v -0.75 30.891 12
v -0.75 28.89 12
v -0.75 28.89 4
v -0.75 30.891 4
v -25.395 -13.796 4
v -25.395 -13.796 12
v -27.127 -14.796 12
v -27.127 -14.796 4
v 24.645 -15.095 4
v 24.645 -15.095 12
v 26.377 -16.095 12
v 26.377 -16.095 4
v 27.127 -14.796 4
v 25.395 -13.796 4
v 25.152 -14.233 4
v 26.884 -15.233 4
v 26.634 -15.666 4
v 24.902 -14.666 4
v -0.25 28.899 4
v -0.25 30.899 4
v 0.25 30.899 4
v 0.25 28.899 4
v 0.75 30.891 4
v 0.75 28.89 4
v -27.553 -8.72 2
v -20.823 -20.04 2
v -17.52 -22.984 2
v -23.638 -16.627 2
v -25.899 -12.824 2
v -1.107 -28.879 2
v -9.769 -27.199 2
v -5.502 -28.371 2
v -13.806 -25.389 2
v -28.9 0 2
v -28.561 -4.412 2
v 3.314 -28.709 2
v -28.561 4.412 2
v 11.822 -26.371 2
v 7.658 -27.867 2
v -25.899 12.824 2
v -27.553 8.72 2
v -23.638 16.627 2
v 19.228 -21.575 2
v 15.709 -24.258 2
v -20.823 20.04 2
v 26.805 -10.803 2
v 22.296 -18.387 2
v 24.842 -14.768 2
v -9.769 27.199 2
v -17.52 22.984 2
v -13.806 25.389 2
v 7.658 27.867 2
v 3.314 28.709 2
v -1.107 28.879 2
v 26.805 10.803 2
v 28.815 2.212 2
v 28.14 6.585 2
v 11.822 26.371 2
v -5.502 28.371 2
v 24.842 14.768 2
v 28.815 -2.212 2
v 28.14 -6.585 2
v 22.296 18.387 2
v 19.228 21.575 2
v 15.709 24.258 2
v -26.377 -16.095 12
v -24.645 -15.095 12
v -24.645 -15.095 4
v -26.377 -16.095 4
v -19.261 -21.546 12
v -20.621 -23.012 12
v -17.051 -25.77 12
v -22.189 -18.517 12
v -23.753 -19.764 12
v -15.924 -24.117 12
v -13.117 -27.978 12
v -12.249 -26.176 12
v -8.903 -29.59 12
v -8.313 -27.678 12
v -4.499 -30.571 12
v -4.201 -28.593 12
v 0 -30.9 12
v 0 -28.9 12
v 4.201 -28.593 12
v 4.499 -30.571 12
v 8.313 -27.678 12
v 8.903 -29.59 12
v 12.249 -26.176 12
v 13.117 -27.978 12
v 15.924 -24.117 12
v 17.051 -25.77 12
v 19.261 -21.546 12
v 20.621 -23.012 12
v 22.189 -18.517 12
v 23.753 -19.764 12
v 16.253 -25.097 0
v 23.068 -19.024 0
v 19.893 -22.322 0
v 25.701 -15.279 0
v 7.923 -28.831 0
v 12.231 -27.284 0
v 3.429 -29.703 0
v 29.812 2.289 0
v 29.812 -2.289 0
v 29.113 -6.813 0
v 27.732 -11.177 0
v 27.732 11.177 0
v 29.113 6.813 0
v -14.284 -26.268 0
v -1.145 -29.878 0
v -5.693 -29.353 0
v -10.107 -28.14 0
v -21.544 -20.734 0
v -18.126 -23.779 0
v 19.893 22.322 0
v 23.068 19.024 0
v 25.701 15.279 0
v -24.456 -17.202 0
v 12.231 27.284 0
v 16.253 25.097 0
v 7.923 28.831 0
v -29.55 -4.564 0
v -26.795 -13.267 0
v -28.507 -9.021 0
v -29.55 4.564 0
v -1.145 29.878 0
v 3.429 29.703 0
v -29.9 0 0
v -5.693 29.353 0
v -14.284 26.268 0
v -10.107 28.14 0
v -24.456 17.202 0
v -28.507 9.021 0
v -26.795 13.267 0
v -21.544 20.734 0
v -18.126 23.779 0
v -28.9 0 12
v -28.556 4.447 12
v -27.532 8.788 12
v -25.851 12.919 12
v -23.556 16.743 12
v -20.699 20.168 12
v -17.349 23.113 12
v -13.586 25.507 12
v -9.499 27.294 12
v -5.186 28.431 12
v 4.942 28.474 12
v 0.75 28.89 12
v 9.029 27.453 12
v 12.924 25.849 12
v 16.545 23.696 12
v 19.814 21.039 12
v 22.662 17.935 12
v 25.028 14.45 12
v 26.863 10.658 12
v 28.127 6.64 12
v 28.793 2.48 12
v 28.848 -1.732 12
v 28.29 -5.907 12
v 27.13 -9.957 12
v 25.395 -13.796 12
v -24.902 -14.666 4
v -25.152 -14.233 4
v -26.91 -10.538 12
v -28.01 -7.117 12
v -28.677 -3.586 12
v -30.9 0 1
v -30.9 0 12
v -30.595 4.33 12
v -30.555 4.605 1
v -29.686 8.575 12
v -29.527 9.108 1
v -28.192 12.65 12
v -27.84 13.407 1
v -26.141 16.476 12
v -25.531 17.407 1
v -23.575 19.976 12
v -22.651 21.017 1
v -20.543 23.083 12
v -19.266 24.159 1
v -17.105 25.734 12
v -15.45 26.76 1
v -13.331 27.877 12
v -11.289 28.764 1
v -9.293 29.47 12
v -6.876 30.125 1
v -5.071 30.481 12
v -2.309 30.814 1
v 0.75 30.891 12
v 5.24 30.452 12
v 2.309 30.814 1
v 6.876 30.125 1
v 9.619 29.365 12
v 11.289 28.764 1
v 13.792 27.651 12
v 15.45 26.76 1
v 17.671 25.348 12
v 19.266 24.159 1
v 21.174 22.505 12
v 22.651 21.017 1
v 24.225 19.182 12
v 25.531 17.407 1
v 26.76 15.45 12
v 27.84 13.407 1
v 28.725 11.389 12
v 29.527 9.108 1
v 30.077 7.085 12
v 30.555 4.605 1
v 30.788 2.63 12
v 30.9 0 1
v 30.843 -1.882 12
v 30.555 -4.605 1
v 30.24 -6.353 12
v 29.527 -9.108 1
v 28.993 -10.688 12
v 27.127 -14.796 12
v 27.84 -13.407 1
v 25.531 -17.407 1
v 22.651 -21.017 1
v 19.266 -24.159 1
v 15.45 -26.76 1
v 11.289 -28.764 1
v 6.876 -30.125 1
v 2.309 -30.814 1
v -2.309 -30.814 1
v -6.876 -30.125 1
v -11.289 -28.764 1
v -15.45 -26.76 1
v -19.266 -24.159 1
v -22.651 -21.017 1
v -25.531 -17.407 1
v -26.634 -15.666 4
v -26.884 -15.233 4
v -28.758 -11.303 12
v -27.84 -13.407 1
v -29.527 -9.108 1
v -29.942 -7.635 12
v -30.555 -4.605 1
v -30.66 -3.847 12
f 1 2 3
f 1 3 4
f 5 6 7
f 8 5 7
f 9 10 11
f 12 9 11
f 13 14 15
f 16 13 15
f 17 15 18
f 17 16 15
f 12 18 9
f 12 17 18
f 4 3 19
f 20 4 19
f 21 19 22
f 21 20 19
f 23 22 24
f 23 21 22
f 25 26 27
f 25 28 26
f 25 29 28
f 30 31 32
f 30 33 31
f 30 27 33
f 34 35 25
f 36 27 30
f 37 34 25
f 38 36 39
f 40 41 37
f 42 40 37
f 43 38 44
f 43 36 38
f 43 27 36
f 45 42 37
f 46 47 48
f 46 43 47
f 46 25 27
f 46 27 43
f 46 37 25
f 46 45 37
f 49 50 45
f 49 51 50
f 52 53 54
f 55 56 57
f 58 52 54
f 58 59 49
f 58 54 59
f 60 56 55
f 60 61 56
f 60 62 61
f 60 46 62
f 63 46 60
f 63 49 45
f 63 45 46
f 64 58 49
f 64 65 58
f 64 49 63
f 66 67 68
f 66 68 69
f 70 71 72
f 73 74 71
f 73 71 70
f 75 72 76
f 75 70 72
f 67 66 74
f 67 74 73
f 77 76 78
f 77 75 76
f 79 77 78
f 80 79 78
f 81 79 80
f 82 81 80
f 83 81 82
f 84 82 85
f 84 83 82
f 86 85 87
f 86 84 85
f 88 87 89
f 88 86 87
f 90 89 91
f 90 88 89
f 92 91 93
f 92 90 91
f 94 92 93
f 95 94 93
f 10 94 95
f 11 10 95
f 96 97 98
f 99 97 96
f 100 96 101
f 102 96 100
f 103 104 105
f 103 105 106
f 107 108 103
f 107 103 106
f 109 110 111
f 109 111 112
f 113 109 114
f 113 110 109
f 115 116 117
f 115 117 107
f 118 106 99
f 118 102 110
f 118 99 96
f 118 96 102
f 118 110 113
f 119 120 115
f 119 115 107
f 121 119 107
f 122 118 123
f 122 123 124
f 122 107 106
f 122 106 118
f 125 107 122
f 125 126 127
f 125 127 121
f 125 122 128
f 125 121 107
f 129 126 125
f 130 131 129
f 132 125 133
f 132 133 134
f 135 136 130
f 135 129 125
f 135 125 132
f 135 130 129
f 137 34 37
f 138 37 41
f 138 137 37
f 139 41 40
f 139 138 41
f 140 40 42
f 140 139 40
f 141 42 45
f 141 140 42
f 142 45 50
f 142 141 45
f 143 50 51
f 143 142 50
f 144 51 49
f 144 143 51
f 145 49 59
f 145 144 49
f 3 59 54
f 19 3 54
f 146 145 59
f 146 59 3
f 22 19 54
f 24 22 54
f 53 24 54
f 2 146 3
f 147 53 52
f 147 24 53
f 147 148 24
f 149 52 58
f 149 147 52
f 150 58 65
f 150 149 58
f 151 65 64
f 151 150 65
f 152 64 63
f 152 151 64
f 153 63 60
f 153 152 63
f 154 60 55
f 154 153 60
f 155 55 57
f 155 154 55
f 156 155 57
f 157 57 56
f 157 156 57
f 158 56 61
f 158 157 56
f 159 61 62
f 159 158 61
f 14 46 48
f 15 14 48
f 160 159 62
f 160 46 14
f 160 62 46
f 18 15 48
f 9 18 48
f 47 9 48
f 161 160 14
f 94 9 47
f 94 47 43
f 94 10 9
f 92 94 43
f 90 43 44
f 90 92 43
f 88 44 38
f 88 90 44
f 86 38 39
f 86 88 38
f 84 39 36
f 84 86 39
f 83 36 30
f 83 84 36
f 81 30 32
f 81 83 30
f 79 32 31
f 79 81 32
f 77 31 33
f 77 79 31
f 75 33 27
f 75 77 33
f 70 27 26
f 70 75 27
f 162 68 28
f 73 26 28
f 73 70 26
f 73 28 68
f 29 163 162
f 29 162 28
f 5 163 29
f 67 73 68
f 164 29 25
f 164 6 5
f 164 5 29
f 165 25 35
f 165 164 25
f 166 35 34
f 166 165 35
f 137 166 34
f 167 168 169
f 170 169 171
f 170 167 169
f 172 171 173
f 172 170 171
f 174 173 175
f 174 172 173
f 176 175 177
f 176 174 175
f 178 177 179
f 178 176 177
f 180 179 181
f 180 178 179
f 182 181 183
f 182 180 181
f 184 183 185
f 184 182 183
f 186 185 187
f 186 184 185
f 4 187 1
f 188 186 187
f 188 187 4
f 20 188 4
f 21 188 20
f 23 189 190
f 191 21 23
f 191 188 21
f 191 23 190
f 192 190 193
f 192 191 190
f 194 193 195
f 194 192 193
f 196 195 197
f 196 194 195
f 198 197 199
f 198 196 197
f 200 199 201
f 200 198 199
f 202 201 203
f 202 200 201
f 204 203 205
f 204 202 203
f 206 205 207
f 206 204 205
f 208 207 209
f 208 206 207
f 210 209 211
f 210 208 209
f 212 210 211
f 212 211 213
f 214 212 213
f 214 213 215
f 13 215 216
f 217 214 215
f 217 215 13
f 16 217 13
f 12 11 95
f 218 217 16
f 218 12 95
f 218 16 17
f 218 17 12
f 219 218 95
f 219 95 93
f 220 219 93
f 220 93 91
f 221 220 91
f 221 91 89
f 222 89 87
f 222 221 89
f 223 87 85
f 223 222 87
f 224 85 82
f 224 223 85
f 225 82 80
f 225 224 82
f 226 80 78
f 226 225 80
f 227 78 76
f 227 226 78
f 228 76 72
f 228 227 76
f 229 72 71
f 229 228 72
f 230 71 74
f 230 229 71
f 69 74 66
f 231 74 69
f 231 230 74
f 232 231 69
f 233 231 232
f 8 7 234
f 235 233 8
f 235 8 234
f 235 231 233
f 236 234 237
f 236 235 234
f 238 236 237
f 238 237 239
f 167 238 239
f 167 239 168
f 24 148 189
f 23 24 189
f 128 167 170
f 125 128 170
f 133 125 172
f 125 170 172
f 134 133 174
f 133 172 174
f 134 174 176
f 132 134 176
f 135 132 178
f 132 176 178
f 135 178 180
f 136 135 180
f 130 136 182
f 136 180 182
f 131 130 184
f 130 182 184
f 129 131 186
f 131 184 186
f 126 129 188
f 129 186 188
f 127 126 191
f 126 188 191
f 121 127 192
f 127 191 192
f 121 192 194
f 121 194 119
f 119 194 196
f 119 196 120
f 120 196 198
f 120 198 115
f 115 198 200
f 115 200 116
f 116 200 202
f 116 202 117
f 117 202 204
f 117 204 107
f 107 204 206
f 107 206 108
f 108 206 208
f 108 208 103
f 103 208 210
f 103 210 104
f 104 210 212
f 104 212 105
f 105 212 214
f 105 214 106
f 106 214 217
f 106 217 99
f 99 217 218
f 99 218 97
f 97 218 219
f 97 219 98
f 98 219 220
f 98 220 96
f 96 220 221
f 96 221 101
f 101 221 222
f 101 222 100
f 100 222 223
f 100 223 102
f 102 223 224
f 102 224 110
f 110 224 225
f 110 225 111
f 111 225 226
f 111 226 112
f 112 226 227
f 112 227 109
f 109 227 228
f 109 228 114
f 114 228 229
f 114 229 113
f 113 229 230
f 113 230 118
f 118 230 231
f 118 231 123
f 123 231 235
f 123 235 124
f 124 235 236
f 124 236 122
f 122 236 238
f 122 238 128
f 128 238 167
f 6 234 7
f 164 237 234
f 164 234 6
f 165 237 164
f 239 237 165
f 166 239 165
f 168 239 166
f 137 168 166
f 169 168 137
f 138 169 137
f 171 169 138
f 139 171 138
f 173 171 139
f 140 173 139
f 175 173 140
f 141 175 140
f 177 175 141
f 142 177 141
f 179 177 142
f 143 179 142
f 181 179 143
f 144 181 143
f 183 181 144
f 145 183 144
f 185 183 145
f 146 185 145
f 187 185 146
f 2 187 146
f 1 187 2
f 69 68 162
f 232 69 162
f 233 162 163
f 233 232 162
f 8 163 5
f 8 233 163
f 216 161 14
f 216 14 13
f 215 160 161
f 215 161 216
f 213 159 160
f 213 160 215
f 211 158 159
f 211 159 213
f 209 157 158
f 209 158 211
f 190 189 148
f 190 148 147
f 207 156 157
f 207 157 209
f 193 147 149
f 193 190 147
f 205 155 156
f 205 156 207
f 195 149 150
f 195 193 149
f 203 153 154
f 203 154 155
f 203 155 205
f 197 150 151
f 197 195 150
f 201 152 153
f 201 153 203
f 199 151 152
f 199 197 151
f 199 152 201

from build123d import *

# Parameters (mm, degrees)
F3_W            = 1.5
F3_H            = 4.2986176481
F4_DEPTH        = 8
F4_COPIES_COUNT = 3
F5_SIZE         = 1


# Not quite as in the source:
# - a pattern or mirror of a feature is missing from the dataset's text; its kind, count and spacing are read off the source's solid


with BuildPart() as f1:
    # F0 (on Front) → F1 (revolve)
    with BuildSketch(Plane.XZ):
        Polygon((-30.9, 0), (0, 0), (0, 2), (-28.9, 2), (-28.9, 12), (-30.9, 12), align=None)
    revolve(axis=Axis((0, 0, 1), (0, 0, -1)))

    # F3 (on offset) → F4 (cut)
    with BuildSketch(Plane.XY.offset(12)):
        with Locations((0, 29.3811720078)):
            Rectangle(F3_W, F3_H)
    f4 = extrude(amount=-F4_DEPTH, mode=Mode.SUBTRACT)

    # F4_copies: F4 ×3 about axis
    f4_copies_axis = Axis((0, 0, 0), (0, 0, 1))
    for i in range(1, F4_COPIES_COUNT):
        add(f4.rotate(f4_copies_axis, i * 360 / F4_COPIES_COUNT), mode=Mode.SUBTRACT)

    # F5
    f5_edges = [f1.edges().sort_by_distance(p)[0] for p in [
        (30.9, 0, 0),
    ]]
    chamfer(f5_edges, length=F5_SIZE)


solid = f1.part
